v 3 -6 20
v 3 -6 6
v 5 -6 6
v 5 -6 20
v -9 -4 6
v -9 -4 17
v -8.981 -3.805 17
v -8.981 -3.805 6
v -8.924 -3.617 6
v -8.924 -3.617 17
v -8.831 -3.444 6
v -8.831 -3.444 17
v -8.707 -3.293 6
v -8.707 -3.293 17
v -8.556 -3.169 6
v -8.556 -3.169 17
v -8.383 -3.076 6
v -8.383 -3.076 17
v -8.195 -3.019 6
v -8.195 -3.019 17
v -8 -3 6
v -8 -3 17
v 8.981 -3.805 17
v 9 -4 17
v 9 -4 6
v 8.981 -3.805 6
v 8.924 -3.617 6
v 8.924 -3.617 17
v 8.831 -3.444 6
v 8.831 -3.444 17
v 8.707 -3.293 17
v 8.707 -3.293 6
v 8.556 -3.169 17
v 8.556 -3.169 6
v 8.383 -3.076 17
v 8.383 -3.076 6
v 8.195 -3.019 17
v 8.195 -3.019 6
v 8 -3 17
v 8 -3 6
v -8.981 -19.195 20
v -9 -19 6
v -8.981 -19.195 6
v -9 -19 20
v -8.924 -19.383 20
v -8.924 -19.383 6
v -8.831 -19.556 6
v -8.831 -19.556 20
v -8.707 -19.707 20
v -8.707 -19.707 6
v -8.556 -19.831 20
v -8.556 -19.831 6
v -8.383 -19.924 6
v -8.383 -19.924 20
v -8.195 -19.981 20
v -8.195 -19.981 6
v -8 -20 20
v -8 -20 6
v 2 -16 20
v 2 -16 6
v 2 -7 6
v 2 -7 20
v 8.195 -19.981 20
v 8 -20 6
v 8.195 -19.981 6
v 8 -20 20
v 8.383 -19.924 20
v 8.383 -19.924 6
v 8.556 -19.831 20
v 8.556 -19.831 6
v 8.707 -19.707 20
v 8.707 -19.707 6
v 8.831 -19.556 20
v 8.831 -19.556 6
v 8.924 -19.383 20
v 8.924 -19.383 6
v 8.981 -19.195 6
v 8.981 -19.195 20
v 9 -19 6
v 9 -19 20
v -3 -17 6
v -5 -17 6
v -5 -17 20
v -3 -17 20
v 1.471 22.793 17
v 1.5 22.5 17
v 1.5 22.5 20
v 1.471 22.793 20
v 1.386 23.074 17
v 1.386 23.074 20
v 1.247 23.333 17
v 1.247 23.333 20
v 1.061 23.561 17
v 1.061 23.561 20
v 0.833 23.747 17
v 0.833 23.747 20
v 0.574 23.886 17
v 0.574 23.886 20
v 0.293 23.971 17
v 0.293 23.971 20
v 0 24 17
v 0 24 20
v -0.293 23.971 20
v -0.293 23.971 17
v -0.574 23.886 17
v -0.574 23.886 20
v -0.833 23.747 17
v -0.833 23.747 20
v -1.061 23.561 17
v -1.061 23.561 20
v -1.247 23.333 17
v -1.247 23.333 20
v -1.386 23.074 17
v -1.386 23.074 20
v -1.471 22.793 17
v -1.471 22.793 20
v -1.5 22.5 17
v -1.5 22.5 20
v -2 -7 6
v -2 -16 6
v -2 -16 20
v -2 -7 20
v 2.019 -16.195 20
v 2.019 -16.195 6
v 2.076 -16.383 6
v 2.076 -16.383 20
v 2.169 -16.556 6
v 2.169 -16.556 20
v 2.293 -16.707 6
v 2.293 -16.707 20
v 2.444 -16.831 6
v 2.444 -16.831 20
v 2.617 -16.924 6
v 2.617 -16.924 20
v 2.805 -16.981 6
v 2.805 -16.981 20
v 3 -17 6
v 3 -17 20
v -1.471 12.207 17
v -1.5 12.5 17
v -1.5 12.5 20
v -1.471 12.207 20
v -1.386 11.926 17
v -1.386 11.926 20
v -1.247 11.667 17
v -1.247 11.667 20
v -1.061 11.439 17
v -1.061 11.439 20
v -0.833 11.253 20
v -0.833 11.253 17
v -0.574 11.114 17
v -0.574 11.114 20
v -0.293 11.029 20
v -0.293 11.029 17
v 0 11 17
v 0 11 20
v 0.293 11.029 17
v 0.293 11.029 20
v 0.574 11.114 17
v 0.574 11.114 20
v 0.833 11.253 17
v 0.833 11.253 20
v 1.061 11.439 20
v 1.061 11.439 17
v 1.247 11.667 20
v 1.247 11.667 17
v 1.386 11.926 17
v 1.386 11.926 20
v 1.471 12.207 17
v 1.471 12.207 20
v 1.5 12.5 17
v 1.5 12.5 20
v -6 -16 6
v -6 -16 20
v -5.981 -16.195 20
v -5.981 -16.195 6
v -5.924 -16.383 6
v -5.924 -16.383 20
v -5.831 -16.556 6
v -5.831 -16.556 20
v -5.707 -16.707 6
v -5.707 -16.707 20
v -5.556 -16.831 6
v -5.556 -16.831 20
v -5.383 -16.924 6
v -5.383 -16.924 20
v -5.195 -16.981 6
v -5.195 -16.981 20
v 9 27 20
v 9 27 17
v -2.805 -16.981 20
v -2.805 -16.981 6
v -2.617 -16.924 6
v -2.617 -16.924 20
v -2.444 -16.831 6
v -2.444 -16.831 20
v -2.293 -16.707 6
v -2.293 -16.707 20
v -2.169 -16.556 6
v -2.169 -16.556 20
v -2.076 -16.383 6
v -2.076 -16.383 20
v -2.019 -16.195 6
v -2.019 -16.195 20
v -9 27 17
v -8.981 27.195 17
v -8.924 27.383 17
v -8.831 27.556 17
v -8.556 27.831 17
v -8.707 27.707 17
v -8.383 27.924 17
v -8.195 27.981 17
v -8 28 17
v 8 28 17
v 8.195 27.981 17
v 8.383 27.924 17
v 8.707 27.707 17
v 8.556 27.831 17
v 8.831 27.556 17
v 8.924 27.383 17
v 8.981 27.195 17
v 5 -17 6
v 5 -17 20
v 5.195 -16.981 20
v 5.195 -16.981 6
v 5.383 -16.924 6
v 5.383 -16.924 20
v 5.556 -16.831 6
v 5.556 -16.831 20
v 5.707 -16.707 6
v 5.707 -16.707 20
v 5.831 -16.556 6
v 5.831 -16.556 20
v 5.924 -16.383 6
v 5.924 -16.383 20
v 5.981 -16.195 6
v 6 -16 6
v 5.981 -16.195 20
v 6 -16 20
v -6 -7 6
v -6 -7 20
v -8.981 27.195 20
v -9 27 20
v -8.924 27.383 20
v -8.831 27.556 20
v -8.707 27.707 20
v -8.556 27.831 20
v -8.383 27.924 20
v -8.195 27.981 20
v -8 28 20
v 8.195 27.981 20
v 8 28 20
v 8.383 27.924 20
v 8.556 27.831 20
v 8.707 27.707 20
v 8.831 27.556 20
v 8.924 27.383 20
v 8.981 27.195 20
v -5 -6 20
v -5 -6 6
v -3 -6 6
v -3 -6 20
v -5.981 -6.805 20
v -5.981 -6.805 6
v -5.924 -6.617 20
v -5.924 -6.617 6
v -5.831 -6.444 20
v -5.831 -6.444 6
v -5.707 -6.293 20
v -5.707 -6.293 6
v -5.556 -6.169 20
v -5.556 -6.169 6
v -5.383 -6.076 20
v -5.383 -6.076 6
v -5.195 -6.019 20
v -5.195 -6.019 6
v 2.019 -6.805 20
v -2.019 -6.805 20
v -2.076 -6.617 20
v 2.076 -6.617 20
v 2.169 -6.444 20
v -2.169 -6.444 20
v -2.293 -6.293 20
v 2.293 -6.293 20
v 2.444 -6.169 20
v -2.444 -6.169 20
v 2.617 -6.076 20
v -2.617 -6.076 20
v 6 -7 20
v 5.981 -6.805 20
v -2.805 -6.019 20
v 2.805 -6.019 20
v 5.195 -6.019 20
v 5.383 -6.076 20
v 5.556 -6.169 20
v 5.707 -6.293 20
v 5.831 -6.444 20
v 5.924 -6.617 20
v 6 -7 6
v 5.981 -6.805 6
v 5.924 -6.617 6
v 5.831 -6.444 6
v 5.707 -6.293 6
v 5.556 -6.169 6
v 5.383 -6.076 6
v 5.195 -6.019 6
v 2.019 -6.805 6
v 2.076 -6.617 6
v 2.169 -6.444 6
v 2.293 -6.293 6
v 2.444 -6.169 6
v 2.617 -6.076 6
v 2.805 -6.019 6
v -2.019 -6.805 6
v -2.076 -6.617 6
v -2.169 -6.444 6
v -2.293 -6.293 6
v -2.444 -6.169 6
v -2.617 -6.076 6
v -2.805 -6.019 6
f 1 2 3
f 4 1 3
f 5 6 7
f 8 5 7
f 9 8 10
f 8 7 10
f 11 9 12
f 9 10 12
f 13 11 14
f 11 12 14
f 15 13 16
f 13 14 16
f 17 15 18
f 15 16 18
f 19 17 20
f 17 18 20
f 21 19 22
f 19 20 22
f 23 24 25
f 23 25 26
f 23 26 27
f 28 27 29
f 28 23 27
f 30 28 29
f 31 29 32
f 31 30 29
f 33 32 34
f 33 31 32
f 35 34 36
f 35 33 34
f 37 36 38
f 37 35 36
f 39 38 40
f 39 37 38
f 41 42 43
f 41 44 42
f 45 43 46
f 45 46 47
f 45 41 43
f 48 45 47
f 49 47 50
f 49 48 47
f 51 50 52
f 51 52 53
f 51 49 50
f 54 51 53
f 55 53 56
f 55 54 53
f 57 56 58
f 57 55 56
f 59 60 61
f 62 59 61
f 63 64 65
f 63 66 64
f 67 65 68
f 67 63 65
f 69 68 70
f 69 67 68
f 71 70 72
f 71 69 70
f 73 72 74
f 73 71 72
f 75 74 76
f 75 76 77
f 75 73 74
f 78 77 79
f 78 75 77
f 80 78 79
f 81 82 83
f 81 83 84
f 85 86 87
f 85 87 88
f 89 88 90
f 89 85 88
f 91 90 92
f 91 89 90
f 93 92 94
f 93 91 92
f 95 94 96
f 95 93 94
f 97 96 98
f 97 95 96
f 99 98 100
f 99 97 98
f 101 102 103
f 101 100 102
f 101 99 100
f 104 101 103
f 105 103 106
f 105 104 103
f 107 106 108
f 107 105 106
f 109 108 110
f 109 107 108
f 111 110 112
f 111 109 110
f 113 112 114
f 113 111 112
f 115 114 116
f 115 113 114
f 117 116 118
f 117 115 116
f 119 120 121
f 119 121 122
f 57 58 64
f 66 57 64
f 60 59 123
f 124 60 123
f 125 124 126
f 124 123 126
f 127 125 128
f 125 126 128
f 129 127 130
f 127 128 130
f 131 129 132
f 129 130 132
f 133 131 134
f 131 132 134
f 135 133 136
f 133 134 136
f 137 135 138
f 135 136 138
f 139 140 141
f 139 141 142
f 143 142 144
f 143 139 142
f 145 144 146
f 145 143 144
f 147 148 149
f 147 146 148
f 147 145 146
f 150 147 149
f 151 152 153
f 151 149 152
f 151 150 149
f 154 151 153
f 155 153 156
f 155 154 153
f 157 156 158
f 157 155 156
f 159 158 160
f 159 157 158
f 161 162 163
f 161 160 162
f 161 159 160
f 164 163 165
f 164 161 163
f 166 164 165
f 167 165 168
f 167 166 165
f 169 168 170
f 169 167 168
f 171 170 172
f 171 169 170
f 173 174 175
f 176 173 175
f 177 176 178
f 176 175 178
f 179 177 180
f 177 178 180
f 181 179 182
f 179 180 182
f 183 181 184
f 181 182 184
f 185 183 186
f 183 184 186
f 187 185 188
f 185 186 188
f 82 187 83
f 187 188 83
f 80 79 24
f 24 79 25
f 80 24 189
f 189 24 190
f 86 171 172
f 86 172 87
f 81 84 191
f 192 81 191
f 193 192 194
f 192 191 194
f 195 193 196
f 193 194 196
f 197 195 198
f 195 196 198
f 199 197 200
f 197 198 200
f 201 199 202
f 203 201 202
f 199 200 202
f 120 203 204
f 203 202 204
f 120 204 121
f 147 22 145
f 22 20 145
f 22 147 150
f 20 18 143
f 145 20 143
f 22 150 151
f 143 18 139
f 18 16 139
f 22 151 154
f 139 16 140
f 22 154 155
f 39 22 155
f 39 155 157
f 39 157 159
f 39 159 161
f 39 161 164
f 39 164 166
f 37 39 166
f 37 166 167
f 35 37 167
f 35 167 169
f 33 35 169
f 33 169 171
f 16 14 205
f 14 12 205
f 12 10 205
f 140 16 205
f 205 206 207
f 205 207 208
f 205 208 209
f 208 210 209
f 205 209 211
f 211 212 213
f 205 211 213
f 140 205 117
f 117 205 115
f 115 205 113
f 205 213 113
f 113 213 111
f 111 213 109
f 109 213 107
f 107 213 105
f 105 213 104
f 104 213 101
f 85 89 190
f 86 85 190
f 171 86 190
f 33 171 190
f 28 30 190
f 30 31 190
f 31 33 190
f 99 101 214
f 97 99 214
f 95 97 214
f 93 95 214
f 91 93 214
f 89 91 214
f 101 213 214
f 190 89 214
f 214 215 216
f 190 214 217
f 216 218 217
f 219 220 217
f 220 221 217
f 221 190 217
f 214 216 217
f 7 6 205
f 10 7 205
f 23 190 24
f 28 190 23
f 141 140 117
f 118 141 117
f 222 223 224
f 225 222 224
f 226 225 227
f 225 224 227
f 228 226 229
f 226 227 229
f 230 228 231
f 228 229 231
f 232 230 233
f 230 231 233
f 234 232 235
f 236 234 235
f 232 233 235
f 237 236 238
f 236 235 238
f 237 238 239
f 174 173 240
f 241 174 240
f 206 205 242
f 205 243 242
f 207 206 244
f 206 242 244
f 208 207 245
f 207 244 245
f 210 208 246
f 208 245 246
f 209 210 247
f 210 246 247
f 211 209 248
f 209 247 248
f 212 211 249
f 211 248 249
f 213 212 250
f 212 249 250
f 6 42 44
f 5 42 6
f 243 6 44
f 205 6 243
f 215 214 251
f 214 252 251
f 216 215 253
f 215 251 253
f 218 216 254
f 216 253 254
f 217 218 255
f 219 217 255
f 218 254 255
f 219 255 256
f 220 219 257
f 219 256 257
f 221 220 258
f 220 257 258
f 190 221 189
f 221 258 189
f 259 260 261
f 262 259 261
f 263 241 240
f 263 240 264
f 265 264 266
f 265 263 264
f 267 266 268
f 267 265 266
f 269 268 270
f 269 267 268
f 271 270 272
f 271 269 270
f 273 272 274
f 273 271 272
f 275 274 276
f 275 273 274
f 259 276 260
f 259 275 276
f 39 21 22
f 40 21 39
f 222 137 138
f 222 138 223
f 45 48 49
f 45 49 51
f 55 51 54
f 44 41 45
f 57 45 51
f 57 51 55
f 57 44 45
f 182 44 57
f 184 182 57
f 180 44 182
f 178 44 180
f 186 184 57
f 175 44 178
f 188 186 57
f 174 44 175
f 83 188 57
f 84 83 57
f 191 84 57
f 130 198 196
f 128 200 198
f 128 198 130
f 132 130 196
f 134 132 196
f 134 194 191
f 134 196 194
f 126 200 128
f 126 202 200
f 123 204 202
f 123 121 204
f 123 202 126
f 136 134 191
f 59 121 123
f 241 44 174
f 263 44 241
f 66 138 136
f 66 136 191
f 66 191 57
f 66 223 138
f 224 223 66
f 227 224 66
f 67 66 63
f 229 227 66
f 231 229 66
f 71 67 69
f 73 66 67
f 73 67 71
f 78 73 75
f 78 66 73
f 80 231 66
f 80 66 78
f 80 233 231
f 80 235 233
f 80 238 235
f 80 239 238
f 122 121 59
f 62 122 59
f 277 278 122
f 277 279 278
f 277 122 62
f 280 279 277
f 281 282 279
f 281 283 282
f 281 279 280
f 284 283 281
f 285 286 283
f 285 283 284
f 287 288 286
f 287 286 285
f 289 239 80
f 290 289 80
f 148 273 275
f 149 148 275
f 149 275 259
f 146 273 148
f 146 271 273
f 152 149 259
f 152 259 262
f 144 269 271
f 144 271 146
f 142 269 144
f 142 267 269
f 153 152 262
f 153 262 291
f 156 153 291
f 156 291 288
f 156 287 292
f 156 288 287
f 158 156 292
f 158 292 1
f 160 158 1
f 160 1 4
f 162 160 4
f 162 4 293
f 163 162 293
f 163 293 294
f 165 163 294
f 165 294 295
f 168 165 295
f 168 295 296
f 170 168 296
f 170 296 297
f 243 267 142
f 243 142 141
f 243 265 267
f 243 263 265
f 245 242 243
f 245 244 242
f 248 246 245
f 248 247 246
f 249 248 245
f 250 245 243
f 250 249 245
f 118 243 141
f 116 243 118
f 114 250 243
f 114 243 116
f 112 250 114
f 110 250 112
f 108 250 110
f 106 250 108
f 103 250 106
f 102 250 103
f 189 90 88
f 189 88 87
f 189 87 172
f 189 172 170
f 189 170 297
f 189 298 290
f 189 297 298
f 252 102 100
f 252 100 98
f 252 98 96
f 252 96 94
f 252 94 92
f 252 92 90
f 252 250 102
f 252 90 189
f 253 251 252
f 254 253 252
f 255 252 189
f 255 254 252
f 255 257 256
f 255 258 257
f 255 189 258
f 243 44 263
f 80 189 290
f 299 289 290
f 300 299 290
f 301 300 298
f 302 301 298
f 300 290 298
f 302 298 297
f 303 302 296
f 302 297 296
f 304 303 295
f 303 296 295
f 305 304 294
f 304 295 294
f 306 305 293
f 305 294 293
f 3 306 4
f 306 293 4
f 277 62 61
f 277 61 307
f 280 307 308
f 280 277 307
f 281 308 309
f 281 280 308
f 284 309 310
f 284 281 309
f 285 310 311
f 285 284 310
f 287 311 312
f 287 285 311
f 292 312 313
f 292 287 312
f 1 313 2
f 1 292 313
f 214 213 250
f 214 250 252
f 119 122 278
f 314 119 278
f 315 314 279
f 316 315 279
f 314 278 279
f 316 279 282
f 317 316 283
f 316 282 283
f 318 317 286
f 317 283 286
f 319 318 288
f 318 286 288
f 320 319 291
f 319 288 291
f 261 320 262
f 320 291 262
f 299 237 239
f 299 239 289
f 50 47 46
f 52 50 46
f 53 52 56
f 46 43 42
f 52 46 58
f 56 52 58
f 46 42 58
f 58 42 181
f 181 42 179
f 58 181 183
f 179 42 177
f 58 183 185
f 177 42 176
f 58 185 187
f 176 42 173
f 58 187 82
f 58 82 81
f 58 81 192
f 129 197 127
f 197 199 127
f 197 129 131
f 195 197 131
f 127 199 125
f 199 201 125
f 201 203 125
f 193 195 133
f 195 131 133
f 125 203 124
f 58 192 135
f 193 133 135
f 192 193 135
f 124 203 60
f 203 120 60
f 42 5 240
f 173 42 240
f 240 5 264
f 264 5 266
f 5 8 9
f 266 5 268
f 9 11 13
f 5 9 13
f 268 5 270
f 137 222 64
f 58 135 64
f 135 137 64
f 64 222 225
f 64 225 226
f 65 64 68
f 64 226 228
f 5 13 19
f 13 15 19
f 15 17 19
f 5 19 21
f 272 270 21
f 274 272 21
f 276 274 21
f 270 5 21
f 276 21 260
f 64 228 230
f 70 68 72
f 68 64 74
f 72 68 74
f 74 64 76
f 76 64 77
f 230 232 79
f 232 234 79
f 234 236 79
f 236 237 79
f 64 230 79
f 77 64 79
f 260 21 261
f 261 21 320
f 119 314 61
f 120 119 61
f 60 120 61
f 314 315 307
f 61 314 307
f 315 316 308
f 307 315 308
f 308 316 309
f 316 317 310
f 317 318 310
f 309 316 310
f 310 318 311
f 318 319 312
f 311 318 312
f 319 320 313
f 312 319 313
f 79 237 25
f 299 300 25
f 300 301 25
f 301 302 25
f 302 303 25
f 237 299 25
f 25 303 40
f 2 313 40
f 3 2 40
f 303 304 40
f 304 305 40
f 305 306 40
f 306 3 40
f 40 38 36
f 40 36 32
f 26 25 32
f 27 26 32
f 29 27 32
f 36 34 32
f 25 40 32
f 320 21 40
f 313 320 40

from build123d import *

# Parameters (mm, degrees)
BOX026_W          = 4
BOX026_H          = 11
BOX026_DEPTH      = 16
BOX027_W          = 4
BOX027_H          = 11
BOX027_DEPTH      = 16
FILLET004_R       = 1
BOX024_W          = 18
BOX024_H          = 17
BOX024_DEPTH      = 14
FILLET005_R       = 1
CYLINDER032_R     = 1.5
CYLINDER032_DEPTH = 10
CYLINDER033_R     = 1.5
CYLINDER033_DEPTH = 10
BOX025_W          = 3
BOX025_H          = 10
BOX025_DEPTH      = 5
BOX023_W          = 18
BOX023_H          = 32
BOX023_DEPTH      = 3
FILLET006_R       = 1


with BuildPart() as cube026:
    # Box026 → Box026 (new body)
    with BuildSketch(Plane(origin=(-6, -17, 6), x_dir=(1, 0, 0), z_dir=(0, 0, 1))):
        with Locations((2, 5.5)):
            Rectangle(BOX026_W, BOX026_H)
    extrude(amount=BOX026_DEPTH)


with BuildPart() as fillet004:
    # Box027 → Box027 (new body)
    with BuildSketch(Plane(origin=(2, -17, 6), x_dir=(1, 0, 0), z_dir=(0, 0, 1))):
        with Locations((2, 5.5)):
            Rectangle(BOX027_W, BOX027_H)
    extrude(amount=BOX027_DEPTH)

    # Fusion001001001011002004002008: union Cube026
    add(cube026.part)

    # Fillet004
    fillet004_edges = [fillet004.edges().sort_by_distance(p)[0] for p in [
        (2, -17, 14),
        (2, -6, 14),
        (6, -17, 14),
        (6, -6, 14),
        (-6, -17, 14),
        (-6, -6, 14),
        (-2, -17, 14),
        (-2, -6, 14),
    ]]
    fillet(fillet004_edges, radius=FILLET004_R)


with BuildPart() as cut002008023012009006003002006_body:
    # Box024 → Box024 (new body)
    with BuildSketch(Plane(origin=(-9, -20, 6), x_dir=(1, 0, 0), z_dir=(0, 0, 1))):
        with Locations((9, 8.5)):
            Rectangle(BOX024_W, BOX024_H)
    extrude(amount=BOX024_DEPTH)

    # Fillet005
    fillet005_edges = [cut002008023012009006003002006_body.edges().sort_by_distance(p)[0] for p in [
        (-9, -20, 13),
        (-9, -3, 13),
        (9, -20, 13),
        (9, -3, 13),
    ]]
    fillet(fillet005_edges, radius=FILLET005_R)

    # Cut002008023012009006003002006002006002004004005004: cut Fillet004
    add(fillet004.part, mode=Mode.SUBTRACT)


with BuildPart() as cylinder032:
    # Cylinder032 → Cylinder032 (new body)
    with BuildSketch(Plane(origin=(0, 12.5, 12.5), x_dir=(1, 0, 0), z_dir=(0, 0, 1))):
        Circle(CYLINDER032_R)
    extrude(amount=CYLINDER032_DEPTH)


with BuildPart() as cylinder033:
    # Cylinder033 → Cylinder033 (new body)
    with BuildSketch(Plane(origin=(0, 22.5, 12.5), x_dir=(1, 0, 0), z_dir=(0, 0, 1))):
        Circle(CYLINDER033_R)
    extrude(amount=CYLINDER033_DEPTH)


with BuildPart() as fusion001001001011002004002005:
    # Box025 → Box025 (new body)
    with BuildSketch(Plane(origin=(-1.5, 12.5, 17), x_dir=(1, 0, 0), z_dir=(0, 0, 1))):
        with Locations((1.5, 5)):
            Rectangle(BOX025_W, BOX025_H)
    extrude(amount=BOX025_DEPTH)

    # Fusion001001001011002004002005: union Cylinder032, Cylinder033
    add(cylinder032.part)
    add(cylinder033.part)


with BuildPart() as fusion001001001011002004002009:
    # Box023 → Box023 (new body)
    with BuildSketch(Plane(origin=(-9, -4, 17), x_dir=(1, 0, 0), z_dir=(0, 0, 1))):
        with Locations((9, 16)):
            Rectangle(BOX023_W, BOX023_H)
    extrude(amount=BOX023_DEPTH)

    # Cut002008023012009006003002006002006002004004005005: cut Fusion001001001011002004002005
    add(fusion001001001011002004002005.part, mode=Mode.SUBTRACT)

    # Fillet006
    fillet006_edges = [fusion001001001011002004002009.edges().sort_by_distance(p)[0] for p in [
        (-9, 28, 18.5),
        (9, 28, 18.5),
    ]]
    fillet(fillet006_edges, radius=FILLET006_R)

    # Fusion001001001011002004002009: union Cut002008023012009006003002006 body
    add(cut002008023012009006003002006_body.part)


solid = fusion001001001011002004002009.part
